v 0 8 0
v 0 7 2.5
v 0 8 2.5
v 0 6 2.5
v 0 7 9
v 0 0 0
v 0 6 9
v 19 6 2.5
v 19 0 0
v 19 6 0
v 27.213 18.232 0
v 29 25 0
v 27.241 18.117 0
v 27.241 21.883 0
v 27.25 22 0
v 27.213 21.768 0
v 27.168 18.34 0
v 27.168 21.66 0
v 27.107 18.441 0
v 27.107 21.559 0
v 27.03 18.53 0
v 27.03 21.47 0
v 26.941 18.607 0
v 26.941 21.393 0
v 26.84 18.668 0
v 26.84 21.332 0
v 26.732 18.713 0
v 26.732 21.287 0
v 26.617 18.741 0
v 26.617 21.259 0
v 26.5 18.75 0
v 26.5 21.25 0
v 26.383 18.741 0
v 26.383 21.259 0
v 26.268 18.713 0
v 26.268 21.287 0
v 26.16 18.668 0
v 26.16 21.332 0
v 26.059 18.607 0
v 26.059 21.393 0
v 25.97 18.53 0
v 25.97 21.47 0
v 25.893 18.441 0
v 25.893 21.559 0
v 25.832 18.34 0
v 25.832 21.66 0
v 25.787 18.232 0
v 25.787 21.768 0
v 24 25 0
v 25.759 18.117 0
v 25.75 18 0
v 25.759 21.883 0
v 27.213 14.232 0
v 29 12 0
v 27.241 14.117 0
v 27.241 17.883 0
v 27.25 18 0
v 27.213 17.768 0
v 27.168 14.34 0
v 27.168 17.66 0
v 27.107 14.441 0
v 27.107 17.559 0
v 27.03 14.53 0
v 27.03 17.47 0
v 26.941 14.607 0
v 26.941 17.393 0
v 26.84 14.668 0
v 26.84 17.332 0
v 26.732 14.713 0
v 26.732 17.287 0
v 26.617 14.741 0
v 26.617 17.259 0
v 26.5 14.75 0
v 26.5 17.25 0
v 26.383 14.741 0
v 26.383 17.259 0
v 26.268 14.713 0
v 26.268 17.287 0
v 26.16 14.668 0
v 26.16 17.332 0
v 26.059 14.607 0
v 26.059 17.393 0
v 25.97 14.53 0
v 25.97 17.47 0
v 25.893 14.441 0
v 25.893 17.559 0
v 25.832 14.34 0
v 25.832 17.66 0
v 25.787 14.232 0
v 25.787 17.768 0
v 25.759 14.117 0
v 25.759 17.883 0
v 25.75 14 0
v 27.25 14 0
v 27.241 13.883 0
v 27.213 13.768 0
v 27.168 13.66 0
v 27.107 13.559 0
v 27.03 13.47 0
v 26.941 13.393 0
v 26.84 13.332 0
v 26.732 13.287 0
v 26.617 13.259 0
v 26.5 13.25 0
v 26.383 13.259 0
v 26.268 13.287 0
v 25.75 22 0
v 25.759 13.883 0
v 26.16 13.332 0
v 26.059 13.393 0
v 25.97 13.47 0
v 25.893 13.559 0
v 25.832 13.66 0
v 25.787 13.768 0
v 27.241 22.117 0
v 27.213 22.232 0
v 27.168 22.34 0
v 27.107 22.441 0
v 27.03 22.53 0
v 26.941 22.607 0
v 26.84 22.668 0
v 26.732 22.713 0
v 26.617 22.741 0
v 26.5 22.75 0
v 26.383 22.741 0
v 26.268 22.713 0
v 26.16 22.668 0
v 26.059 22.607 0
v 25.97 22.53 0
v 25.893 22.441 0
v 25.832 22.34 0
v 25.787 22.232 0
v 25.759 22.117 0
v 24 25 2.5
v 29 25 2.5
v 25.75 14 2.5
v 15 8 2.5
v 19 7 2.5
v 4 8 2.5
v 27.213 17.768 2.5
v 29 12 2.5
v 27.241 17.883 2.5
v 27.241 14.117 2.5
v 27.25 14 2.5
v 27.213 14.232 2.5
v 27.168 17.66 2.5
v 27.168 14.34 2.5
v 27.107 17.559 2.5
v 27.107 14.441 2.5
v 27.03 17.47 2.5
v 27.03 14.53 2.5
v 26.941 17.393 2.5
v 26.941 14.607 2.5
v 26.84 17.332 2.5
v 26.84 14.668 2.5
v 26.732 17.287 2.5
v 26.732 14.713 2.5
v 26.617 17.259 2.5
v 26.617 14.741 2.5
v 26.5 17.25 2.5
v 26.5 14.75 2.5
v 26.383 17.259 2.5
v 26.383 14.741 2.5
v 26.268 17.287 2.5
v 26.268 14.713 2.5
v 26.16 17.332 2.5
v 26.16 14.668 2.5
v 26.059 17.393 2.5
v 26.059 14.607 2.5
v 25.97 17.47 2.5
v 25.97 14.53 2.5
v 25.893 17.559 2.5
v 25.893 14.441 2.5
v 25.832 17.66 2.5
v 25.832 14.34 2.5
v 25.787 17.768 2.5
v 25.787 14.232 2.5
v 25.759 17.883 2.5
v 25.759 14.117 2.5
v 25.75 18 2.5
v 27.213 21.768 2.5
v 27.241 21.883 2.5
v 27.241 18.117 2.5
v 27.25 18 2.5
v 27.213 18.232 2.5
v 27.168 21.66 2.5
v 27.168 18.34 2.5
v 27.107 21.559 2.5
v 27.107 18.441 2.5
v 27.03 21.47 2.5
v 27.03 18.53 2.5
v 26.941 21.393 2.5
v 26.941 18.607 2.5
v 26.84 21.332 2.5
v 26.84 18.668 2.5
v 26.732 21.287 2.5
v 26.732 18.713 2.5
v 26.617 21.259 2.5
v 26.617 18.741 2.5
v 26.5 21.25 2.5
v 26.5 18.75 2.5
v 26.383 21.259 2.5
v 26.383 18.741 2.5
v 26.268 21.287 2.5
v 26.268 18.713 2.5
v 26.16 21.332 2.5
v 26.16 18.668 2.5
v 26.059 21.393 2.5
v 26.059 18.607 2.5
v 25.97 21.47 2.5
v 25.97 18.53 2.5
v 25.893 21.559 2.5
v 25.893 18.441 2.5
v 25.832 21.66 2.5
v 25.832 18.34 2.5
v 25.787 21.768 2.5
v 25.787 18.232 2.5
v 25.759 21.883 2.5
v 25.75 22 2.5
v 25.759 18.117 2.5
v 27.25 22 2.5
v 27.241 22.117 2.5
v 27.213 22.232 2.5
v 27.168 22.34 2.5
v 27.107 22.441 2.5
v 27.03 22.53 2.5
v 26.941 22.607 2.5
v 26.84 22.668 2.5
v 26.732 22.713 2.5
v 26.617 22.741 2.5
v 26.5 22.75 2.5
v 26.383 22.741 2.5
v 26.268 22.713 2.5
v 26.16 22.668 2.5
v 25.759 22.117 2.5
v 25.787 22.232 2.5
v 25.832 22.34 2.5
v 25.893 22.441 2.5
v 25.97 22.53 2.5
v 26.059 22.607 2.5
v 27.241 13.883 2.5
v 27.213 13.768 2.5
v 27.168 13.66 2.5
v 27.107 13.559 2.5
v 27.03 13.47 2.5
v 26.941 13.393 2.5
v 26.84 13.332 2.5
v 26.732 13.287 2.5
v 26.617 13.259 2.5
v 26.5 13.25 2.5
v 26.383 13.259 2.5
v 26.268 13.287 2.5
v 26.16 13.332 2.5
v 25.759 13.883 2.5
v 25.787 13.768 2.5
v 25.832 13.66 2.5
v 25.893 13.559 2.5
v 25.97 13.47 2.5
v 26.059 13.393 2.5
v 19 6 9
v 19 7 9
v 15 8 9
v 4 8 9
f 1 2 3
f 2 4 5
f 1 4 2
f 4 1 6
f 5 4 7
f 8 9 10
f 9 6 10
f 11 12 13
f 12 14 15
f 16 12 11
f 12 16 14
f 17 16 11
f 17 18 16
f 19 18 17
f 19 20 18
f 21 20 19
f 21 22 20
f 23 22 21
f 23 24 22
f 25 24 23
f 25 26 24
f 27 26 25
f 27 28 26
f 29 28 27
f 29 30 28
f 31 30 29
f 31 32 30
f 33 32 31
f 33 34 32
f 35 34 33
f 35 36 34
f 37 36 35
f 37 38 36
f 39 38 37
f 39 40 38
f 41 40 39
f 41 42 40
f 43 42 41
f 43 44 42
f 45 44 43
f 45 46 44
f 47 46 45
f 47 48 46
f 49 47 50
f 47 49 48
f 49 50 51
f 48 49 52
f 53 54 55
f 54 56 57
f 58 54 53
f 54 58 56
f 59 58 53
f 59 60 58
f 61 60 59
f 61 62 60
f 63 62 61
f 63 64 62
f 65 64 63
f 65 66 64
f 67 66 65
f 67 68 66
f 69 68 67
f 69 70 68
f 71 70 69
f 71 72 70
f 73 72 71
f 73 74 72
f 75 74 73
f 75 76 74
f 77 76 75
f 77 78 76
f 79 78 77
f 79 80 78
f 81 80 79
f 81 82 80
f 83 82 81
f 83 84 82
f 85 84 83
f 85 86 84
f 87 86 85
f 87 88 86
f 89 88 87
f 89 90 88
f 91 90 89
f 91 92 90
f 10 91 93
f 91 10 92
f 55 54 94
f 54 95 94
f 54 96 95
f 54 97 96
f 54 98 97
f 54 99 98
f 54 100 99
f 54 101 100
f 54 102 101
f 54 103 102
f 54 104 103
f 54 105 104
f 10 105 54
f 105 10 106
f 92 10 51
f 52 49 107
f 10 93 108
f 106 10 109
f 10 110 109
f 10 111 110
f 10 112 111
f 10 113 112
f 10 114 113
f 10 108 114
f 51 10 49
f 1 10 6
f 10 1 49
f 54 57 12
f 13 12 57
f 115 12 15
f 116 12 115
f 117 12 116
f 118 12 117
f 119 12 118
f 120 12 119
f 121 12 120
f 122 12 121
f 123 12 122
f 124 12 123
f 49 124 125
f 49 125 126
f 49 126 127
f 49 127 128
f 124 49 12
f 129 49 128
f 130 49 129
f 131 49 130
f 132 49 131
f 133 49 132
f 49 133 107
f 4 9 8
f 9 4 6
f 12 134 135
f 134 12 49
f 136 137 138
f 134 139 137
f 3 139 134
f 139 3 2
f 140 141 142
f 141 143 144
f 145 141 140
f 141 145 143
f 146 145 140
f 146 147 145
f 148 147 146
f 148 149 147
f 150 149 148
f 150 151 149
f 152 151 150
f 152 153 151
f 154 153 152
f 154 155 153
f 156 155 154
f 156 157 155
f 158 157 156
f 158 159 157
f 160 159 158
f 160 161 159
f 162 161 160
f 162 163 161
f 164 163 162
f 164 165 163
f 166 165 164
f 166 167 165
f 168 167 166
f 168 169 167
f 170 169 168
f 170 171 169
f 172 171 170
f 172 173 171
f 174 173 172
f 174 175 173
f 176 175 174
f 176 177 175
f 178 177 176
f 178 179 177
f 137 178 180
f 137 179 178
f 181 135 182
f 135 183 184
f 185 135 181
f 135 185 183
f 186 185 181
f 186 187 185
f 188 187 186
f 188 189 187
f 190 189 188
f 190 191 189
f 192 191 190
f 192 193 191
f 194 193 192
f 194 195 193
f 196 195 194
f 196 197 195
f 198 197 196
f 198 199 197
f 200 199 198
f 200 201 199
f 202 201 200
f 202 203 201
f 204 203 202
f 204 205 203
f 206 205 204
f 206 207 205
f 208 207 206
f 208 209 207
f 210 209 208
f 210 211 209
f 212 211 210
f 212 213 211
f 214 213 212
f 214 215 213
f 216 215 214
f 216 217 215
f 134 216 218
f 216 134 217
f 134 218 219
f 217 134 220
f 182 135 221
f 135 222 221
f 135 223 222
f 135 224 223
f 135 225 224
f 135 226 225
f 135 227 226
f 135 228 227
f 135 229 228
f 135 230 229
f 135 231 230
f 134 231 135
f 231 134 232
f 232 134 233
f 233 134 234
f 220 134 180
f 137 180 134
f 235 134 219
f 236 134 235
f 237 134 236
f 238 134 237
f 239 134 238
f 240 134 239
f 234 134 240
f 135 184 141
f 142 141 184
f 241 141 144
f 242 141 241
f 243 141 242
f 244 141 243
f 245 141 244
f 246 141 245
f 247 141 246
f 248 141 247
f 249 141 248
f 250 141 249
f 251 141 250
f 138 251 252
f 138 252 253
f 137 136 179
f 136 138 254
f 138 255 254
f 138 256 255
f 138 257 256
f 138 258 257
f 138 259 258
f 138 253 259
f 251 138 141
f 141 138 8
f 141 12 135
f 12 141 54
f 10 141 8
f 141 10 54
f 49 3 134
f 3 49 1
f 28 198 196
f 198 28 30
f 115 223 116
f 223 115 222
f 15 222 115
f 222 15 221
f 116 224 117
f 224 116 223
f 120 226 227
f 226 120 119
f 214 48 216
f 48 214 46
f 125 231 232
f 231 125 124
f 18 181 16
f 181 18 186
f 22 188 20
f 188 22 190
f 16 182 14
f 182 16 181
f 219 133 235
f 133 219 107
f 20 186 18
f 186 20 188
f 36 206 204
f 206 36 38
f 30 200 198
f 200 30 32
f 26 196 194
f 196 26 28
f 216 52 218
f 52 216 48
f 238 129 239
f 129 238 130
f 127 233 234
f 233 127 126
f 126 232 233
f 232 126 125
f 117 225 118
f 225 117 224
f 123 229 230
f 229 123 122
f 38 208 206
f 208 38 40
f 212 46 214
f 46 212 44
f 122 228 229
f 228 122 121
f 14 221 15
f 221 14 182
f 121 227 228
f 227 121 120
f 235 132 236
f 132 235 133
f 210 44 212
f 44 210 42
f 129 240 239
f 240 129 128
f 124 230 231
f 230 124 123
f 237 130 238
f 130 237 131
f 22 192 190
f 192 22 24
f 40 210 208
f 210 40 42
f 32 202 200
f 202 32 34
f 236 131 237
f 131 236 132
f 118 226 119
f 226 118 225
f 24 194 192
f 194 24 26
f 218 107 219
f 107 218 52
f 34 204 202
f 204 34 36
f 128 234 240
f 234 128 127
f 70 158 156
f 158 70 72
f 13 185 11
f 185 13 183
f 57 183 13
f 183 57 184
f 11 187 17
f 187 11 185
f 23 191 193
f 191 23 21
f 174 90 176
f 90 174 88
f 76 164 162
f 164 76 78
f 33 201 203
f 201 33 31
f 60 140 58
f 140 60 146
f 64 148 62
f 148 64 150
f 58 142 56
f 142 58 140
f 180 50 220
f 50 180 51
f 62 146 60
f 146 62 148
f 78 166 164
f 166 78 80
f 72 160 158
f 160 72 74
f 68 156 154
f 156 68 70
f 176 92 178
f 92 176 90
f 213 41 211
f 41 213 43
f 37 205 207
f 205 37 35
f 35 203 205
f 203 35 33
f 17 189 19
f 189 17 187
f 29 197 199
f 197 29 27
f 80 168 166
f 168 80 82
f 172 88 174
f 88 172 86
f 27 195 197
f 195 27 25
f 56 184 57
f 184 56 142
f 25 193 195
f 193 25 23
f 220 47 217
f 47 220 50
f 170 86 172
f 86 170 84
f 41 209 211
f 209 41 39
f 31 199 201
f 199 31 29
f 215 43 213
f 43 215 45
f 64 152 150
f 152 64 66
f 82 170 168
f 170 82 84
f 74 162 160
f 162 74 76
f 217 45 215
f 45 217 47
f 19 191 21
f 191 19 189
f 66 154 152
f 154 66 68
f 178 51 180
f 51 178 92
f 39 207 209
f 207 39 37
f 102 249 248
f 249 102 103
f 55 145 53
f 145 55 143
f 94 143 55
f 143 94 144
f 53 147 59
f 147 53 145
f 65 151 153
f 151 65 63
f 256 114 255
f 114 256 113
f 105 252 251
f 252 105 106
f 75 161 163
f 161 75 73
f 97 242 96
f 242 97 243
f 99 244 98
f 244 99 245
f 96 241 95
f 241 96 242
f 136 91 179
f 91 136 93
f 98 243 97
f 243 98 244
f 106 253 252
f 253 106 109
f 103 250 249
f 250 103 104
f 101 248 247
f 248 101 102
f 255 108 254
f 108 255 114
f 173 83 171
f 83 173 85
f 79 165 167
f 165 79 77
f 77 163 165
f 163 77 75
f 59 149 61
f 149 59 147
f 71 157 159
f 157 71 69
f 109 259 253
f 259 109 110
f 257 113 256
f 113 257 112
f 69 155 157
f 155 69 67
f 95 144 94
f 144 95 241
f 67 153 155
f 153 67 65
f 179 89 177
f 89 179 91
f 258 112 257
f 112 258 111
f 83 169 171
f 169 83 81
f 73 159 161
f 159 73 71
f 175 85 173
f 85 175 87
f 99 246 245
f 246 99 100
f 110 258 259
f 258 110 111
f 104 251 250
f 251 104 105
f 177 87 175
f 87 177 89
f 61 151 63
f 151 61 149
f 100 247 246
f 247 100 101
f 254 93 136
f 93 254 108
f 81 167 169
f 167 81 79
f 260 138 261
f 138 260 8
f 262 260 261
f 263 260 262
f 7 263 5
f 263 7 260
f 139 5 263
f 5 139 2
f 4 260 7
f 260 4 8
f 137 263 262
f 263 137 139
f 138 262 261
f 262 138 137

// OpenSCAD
$fn=40;
ZZ=2.5;
ZZ2=9;

module bottom() {
    XX=19;
    YY=6;
    //  0      1        2         3        4         5
    P=[[0,0,0],[0,YY,0],[XX,YY,0],[XX,0,0],[0,YY,ZZ],[XX,YY,ZZ]];
    F=[[0,1,2,3],[0,4,5,3]];
    // F=[[0,1,2,3],[4,5]] works, but gives degenerate polygon error
    hull() polyhedron(points=P,faces=F);
}

module holes_in_bottom() {
}

module top() {
    // TODO: round corners at 29,25 and 29,12
    P=[[0,6],[0,8],[24,25],[29,25],[29,12],[19,6]];
    difference() {
        linear_extrude(ZZ) {
            polygon(P);
        }
        translate([26.5,22,0]) cylinder(ZZ,d=1.5);
        translate([26.5,18,0]) cylinder(ZZ,d=1.5);
        translate([26.5,14,0]) cylinder(ZZ,d=1.5);
    }
}


module body() {
    union() {
       difference() {bottom(); holes_in_bottom(); }
       top();
    }
}

module wing() {
    P=[[0,6],[0,7],[4,8],[15,8],[19,7],[19,6]];
    linear_extrude(ZZ2) {
        polygon(P);
    }
}

module holes_in_wing() {
}

module main() {
    body();
    difference() { wing(); holes_in_wing(); }
}

main();
